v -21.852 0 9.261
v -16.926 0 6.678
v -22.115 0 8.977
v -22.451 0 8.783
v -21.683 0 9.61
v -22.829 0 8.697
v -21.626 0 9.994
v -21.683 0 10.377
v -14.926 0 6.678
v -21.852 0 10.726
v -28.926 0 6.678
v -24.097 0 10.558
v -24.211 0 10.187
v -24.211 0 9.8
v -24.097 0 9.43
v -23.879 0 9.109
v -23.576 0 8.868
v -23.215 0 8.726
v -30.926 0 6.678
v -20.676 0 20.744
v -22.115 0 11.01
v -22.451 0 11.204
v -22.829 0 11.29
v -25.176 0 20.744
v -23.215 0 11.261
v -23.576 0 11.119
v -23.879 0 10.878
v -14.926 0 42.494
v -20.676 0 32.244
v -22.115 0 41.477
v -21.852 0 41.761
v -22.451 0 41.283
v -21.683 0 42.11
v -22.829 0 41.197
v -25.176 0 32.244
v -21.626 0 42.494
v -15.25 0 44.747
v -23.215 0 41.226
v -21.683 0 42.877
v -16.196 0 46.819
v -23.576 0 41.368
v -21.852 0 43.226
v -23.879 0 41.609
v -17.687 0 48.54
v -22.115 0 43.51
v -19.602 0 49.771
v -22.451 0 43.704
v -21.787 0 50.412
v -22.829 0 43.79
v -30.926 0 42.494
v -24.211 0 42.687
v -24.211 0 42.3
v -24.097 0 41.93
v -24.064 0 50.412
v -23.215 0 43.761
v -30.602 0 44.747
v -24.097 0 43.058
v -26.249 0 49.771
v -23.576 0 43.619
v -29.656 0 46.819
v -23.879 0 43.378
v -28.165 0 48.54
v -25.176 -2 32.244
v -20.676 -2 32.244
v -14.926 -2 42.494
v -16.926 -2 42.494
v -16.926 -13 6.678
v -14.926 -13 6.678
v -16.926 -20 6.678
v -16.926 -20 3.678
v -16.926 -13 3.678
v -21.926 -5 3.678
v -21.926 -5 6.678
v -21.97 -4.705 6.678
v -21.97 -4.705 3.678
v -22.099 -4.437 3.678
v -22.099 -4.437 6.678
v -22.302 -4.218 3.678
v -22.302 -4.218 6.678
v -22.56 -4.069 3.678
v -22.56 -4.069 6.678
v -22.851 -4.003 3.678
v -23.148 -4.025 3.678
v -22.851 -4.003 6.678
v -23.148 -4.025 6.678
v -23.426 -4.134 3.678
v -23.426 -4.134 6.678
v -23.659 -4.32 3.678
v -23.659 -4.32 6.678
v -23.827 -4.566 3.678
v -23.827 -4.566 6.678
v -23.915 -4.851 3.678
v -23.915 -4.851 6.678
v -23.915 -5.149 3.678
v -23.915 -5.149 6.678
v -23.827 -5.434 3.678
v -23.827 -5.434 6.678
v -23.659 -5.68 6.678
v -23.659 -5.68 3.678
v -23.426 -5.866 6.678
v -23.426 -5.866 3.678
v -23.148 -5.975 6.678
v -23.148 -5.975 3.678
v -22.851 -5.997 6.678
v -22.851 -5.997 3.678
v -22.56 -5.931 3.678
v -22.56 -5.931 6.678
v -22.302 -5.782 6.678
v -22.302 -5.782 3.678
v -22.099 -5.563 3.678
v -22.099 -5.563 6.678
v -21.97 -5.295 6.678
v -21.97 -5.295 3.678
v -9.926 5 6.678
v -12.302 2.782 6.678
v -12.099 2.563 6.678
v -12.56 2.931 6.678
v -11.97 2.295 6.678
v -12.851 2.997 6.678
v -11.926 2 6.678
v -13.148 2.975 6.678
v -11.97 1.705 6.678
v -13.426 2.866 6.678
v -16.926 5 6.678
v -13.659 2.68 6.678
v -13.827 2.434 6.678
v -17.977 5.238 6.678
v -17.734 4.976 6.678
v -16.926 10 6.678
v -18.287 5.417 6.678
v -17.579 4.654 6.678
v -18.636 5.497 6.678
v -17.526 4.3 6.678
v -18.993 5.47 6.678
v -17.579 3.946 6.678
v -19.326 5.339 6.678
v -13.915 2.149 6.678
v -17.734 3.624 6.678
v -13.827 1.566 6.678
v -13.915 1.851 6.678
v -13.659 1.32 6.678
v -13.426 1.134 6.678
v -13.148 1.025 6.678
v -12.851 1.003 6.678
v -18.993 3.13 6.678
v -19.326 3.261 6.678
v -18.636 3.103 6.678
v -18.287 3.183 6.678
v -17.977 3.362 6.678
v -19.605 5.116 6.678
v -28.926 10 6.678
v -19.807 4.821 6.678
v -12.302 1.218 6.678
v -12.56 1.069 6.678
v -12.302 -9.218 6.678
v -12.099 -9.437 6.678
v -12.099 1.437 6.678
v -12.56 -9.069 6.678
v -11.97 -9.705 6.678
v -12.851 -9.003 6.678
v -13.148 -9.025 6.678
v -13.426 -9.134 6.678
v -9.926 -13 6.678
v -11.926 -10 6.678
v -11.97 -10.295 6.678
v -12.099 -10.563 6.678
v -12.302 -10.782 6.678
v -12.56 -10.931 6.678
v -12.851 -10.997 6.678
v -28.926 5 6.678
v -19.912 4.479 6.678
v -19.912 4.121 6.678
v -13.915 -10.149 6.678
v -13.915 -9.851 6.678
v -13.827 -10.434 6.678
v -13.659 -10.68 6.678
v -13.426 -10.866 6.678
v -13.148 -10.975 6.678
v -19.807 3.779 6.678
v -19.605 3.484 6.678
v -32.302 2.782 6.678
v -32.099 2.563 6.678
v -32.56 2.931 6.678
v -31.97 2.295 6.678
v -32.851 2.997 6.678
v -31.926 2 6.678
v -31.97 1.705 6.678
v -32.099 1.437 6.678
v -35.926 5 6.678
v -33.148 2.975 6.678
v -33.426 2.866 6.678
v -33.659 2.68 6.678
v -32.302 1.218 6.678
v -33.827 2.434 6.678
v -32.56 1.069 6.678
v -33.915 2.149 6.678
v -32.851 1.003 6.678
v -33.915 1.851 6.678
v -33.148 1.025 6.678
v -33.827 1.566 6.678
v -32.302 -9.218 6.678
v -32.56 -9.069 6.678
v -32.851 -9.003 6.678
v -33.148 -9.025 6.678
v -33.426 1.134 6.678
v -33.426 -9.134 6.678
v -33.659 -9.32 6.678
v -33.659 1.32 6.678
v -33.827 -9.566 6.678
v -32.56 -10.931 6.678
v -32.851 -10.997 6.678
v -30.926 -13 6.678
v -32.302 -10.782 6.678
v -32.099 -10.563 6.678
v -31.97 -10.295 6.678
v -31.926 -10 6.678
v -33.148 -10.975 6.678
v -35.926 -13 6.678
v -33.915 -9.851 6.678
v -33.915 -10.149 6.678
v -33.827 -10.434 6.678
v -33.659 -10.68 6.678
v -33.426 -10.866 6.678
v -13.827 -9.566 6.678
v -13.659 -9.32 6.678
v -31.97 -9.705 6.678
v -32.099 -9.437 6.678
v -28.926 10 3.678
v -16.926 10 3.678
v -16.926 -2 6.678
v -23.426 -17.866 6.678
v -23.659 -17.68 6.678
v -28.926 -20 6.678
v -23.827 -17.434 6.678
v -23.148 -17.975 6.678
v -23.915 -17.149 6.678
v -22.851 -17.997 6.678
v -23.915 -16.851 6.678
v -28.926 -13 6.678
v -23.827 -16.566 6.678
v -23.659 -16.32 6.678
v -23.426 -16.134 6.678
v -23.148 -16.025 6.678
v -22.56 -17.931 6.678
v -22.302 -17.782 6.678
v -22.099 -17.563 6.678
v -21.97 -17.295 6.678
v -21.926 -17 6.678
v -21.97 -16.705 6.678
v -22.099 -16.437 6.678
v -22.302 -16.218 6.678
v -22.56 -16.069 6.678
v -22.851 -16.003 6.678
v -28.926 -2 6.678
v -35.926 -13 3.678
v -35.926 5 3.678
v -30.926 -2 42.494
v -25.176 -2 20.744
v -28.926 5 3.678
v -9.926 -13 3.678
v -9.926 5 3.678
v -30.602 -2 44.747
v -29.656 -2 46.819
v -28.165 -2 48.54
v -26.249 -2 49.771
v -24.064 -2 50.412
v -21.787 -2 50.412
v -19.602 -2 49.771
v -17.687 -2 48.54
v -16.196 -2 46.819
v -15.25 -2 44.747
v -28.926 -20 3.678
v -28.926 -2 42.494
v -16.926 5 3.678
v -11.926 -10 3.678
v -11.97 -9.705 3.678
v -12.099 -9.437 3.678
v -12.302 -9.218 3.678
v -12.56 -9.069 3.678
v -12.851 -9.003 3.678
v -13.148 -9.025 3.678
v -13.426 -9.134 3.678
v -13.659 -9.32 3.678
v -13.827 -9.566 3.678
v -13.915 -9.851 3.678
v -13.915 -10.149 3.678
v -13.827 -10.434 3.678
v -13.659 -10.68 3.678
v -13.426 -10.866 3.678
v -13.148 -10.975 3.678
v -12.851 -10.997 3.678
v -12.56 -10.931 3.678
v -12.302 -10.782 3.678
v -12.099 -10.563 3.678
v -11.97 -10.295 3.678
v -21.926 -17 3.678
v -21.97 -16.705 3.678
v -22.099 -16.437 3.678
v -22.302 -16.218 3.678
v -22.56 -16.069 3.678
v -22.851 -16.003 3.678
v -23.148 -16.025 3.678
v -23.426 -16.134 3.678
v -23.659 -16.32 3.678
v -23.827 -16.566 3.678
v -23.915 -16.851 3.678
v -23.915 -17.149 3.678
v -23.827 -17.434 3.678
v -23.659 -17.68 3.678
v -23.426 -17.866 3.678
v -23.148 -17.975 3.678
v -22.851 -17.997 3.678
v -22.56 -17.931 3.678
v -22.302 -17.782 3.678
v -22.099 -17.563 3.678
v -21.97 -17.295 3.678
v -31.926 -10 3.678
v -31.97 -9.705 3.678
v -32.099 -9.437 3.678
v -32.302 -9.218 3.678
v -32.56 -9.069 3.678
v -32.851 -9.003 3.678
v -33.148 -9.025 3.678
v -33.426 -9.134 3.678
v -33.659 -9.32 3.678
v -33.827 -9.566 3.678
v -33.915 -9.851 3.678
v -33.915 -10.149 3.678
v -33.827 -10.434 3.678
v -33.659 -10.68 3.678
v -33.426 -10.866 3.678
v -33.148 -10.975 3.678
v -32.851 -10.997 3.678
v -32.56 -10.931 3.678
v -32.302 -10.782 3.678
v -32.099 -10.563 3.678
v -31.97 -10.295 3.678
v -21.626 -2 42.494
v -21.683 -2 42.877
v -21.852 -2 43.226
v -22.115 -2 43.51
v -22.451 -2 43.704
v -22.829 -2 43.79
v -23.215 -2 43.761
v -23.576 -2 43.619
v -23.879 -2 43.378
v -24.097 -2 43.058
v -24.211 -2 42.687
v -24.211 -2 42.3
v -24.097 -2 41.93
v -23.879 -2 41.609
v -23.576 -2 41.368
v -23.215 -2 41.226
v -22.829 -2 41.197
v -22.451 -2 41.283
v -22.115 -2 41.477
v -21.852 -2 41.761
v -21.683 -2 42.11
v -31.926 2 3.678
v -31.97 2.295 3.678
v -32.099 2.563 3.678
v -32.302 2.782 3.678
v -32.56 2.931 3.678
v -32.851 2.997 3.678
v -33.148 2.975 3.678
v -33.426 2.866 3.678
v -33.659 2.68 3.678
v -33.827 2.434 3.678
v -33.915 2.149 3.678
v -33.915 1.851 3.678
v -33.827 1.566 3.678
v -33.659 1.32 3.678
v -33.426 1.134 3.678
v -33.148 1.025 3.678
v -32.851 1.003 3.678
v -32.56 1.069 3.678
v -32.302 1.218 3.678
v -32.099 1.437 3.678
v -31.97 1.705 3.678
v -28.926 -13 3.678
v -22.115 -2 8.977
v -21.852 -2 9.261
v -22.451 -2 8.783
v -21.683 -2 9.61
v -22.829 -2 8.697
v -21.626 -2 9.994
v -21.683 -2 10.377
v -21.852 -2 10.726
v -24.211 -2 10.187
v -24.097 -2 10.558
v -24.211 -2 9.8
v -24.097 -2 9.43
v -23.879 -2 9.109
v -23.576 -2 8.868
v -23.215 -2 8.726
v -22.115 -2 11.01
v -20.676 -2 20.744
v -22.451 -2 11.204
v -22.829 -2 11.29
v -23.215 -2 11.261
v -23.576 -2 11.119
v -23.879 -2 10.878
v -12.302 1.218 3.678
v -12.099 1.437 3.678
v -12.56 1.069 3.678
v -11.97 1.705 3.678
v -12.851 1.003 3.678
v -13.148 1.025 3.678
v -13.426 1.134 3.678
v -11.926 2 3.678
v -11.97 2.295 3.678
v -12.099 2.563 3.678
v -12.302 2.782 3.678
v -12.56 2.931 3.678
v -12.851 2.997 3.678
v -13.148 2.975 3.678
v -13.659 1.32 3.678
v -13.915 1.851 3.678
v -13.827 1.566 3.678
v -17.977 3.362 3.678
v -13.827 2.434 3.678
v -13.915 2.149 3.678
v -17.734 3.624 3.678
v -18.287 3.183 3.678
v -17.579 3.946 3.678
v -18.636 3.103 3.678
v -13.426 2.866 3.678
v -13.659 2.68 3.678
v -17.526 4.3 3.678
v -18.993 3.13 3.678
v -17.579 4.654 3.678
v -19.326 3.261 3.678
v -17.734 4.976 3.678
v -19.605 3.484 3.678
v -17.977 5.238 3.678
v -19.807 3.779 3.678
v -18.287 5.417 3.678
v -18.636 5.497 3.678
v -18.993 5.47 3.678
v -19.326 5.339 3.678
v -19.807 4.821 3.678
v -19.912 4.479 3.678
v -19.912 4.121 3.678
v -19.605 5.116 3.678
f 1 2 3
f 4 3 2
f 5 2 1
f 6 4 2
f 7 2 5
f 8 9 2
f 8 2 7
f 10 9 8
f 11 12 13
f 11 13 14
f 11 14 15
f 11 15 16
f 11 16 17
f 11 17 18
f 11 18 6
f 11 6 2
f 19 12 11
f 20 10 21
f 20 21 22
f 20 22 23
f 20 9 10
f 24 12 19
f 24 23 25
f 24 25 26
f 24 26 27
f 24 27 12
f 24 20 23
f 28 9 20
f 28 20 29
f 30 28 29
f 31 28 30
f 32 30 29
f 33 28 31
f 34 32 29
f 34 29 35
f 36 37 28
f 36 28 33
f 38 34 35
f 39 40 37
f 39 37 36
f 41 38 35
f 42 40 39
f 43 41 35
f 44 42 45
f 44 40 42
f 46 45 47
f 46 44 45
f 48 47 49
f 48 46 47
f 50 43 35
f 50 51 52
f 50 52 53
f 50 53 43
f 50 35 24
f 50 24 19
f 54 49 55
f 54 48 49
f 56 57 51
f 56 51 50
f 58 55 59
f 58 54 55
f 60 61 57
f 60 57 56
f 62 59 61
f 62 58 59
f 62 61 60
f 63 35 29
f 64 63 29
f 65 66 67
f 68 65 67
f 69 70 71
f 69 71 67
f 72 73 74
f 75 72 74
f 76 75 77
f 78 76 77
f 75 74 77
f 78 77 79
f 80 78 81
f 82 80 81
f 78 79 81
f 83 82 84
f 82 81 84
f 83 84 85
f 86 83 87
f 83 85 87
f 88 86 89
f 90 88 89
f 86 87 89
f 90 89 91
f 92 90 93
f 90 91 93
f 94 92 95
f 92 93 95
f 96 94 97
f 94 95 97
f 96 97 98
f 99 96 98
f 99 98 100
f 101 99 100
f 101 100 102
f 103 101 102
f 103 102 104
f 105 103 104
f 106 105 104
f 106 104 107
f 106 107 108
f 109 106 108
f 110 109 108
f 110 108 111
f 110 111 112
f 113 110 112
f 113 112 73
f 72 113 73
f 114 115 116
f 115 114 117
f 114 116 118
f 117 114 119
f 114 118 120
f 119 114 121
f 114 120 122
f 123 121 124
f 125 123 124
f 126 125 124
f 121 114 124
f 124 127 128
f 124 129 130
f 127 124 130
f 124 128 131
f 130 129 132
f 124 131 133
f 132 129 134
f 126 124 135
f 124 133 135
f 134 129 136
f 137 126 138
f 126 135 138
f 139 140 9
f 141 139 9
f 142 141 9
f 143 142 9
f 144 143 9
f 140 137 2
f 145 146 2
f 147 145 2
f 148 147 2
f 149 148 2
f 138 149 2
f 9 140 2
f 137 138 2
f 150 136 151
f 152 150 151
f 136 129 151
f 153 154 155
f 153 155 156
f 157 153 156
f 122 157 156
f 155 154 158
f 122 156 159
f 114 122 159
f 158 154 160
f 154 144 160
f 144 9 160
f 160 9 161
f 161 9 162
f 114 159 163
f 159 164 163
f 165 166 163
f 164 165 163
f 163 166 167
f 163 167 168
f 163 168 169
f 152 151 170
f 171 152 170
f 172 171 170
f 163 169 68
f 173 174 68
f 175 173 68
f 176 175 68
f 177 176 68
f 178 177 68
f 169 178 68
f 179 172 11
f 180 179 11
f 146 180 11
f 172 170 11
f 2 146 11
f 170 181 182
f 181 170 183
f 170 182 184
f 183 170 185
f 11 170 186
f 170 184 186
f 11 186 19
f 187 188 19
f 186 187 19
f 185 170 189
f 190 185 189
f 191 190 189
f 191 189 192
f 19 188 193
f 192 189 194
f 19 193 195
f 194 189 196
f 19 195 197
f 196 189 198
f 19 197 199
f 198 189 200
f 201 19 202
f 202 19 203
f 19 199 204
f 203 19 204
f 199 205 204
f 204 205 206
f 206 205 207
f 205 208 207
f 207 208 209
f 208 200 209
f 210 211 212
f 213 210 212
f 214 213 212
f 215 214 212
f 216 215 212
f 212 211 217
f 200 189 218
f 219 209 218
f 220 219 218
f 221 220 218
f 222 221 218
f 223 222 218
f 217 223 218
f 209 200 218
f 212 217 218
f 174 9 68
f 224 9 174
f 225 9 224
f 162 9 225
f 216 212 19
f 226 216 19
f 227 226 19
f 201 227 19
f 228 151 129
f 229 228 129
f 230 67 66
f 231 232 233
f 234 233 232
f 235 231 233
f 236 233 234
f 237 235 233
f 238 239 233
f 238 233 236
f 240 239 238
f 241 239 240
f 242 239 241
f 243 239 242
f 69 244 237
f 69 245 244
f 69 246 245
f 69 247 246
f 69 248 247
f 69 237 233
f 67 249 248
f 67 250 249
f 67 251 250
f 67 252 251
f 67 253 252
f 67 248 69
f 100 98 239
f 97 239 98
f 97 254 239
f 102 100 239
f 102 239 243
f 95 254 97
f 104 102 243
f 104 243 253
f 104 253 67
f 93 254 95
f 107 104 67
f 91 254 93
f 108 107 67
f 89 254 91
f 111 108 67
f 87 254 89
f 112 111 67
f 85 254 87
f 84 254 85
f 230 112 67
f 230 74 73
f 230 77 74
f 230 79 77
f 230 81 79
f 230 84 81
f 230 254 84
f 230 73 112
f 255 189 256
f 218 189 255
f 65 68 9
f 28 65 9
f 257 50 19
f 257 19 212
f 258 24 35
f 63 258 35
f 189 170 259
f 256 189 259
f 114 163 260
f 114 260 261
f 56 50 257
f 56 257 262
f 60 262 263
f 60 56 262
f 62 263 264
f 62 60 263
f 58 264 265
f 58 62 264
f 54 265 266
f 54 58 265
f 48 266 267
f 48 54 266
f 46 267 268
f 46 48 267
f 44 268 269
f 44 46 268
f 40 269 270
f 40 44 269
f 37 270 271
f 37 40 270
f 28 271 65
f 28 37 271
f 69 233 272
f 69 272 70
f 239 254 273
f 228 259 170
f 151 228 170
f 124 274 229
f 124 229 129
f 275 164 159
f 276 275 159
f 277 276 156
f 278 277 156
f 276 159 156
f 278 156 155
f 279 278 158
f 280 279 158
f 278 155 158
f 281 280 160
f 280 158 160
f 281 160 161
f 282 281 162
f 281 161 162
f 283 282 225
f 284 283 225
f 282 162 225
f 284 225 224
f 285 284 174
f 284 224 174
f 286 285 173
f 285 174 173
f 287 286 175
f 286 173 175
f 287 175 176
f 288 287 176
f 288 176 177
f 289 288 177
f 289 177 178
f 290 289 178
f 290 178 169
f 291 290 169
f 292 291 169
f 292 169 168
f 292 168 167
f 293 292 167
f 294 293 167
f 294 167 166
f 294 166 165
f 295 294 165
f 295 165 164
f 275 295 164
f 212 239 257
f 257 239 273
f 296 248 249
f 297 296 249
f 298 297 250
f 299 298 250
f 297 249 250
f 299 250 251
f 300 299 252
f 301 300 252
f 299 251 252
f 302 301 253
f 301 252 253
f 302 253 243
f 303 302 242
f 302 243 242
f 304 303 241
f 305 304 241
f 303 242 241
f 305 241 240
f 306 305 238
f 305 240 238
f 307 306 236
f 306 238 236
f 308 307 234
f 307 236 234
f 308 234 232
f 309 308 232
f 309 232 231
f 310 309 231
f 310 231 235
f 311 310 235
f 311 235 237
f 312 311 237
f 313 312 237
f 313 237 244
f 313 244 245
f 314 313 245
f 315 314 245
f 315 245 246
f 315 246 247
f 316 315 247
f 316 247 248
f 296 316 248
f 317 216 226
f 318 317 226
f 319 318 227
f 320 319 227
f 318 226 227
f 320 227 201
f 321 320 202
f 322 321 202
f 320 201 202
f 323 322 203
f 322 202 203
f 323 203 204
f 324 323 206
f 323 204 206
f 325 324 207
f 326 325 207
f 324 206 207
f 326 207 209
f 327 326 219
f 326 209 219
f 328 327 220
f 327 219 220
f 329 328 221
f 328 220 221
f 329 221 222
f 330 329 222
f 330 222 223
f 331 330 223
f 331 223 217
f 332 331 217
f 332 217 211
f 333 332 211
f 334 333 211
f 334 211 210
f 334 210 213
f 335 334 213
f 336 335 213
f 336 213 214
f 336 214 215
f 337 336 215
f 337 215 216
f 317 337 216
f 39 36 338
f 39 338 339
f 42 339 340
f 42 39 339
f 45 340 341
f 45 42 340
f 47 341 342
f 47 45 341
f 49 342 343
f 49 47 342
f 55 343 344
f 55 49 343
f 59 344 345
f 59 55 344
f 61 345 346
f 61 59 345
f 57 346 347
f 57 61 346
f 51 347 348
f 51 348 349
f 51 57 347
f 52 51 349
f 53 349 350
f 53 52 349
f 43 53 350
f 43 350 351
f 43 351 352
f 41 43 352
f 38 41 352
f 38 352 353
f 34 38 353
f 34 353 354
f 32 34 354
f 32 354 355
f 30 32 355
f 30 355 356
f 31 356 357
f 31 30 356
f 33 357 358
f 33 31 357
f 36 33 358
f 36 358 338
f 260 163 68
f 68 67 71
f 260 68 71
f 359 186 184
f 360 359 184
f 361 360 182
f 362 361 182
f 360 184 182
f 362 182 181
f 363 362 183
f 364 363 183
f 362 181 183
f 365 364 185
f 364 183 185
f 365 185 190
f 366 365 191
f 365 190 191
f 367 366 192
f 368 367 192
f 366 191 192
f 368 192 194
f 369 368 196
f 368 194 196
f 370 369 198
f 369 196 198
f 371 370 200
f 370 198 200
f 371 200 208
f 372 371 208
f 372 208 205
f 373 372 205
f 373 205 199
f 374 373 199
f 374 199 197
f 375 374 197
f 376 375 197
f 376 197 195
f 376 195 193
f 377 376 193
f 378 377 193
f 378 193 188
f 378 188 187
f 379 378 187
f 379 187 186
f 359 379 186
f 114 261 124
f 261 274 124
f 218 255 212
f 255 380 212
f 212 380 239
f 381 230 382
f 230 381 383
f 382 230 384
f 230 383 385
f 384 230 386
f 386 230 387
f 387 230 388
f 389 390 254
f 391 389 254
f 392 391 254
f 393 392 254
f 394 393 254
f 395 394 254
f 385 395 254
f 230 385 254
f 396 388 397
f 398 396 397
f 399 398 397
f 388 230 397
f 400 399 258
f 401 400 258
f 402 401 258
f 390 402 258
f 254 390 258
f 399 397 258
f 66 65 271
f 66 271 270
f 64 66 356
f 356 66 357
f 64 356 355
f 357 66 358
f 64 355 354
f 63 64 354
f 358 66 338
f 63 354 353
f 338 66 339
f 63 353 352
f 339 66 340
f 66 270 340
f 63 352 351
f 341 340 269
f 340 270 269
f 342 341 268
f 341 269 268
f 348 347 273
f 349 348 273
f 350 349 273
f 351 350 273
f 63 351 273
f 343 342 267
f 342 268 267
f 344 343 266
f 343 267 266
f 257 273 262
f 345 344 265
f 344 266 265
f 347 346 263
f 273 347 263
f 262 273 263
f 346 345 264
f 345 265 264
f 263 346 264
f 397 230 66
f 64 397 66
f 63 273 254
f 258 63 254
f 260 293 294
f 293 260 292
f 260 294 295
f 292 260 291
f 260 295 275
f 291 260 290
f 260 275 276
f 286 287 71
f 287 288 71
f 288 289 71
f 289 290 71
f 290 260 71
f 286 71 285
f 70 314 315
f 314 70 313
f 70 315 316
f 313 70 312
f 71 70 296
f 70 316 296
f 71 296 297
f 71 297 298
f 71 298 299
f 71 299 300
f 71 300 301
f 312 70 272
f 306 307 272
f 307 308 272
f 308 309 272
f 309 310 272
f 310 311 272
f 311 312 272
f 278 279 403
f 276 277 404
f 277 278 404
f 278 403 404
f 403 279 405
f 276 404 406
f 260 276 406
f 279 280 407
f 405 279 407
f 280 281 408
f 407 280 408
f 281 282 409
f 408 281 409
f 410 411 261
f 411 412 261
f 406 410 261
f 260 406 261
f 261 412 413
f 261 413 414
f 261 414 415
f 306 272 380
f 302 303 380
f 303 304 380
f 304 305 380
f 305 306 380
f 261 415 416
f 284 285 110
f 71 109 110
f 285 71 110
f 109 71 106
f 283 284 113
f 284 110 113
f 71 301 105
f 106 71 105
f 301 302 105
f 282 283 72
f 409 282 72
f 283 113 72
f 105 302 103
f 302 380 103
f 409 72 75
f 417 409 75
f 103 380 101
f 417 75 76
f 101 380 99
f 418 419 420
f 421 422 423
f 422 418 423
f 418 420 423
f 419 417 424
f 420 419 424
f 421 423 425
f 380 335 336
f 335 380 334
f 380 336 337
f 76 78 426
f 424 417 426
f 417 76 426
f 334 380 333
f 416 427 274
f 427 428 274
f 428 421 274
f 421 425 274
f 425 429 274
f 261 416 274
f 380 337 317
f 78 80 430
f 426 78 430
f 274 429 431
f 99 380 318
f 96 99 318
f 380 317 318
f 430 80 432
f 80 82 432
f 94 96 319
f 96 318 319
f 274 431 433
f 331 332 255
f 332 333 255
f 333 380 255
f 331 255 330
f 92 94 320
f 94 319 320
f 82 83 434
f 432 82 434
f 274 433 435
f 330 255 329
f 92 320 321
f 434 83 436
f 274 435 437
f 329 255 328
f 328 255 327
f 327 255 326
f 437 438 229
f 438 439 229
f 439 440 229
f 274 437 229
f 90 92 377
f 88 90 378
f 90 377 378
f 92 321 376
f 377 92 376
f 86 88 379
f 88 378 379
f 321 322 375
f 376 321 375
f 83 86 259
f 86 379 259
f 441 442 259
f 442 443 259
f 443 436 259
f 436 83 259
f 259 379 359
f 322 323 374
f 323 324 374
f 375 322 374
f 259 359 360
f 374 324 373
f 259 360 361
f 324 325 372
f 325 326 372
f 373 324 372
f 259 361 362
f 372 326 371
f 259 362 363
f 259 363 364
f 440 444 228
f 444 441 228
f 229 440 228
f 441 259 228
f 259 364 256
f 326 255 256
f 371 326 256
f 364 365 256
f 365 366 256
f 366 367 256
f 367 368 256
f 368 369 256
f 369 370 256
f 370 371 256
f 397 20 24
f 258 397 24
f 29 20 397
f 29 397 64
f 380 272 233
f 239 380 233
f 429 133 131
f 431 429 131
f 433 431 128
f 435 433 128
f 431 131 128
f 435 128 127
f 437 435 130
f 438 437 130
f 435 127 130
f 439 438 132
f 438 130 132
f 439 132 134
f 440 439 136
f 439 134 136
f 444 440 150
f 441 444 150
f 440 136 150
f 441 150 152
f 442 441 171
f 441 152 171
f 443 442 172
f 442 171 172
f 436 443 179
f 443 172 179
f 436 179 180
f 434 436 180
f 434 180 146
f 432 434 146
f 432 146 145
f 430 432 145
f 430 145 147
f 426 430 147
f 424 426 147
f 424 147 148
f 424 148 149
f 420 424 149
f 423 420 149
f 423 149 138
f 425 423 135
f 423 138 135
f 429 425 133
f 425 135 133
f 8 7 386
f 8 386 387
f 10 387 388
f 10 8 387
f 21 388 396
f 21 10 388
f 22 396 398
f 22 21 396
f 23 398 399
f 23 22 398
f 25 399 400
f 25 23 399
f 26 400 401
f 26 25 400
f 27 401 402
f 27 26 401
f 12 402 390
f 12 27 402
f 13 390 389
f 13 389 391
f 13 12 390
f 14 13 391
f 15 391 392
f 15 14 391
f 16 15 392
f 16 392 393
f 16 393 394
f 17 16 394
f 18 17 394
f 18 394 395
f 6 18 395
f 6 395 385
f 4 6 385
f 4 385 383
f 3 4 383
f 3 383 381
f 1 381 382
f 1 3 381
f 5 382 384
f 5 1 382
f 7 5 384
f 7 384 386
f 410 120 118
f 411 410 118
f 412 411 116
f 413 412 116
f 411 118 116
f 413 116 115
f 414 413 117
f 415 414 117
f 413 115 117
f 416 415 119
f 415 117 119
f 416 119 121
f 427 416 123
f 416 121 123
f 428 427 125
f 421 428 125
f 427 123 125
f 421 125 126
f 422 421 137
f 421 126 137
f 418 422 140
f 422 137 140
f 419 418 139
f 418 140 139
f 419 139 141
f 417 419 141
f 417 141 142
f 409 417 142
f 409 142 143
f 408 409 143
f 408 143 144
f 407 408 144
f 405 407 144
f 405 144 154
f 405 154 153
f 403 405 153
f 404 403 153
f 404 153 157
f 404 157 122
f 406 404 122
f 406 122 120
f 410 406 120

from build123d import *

# Parameters (mm, degrees)
F0_R          = 1.3
F1_DEPTH      = 2
F2_W          = 12
F2_H          = 3
F3_DEPTH      = 18
F3_DEPTH_BACK = 12
F4_W          = 5
F4_H          = 3
F4_W_2        = 2
F4_H_2        = 35.8160760757
F5_DEPTH      = 2
F6_W          = 2
F6_H          = 35.8160760757
F7_DEPTH      = 2
F9_DEPTH      = 5
F11_DEPTH     = 5
F12_R         = 1
F13_DEPTH     = 5
F14_W         = 2.25
F14_H         = 11.5
F15_DEPTH     = 3
F16_R         = 1.2
F17_DEPTH     = 3
F19_DEPTH     = 2


with BuildPart() as f1:
    # F0 (on Front) → F1 (new body)
    with BuildSketch(Plane.XZ):
        with BuildLine():
            Line((-16.9256870747, 6.6775220651), (-16.9256870747, 9.9935981408))
            Line((-16.9256870747, 9.9935981408), (-16.9256870747, 10.6775220651))
            Line((-16.9256870747, 10.6775220651), (-16.9256870747, 42.4935981408))
            ThreePointArc((-16.9256870747, 42.4935981408), (-22.9256870747, 48.4935981408), (-28.9256870747, 42.4935981408))
            Line((-28.9256870747, 42.4935981408), (-28.9256870747, 9.9935981408))
            Line((-28.9256870747, 9.9935981408), (-28.9256870747, 6.6775220651))
            Line((-28.9256870747, 6.6775220651), (-16.9424954802, 6.6775220651))
            Line((-16.9424954802, 6.6775220651), (-16.9256870747, 6.6775220651))
        make_face()
        with Locations((-22.9256870747, 9.9935981408)):
            Circle(F0_R, mode=Mode.SUBTRACT)
        with Locations((-22.9256870747, 42.4935981408)):
            Circle(F0_R, mode=Mode.SUBTRACT)
    extrude(amount=F1_DEPTH)

    # F2 (on face) → F3 (join, two sides)
    with BuildSketch(Plane.XZ.offset(2)) as f3_sk:
        with Locations((-22.9256870747, 5.1775220651)):
            Rectangle(F2_W, F2_H)
    extrude(amount=F3_DEPTH)
    extrude(f3_sk.sketch, amount=-F3_DEPTH_BACK)

    # F4 (on face) → F5 (join)
    with BuildSketch(Plane.YZ.offset(-16.9256870747)):
        Polygon((-13, 6.6775220651), (-2, 6.6775220651), (-2, 42.4935981408), align=None)
        Polygon((0, 3.6775220651), (0, 6.6775220651), (-2, 6.6775220651), (-13, 6.6775220651), (-13, 3.6775220651), align=None)
        with Locations((2.5, 5.1775220651)):
            Rectangle(F4_W, F4_H)
        with Locations((-1, 24.5855601029)):
            Rectangle(F4_W_2, F4_H_2)
    extrude(amount=F5_DEPTH)

    # F6 (on face) → F7 (join)
    with BuildSketch(Plane(origin=(-28.9256870747, 0, 0), x_dir=(0, -1, 0), z_dir=(-1, 0, 0))):
        Polygon((0, 6.6775220651), (-5, 6.6775220651), (-5, 3.6775220651), (13, 3.6775220651), (13, 6.6775220651), (2, 6.6775220651), align=None)
        Polygon((2, 42.4935981408), (2, 6.6775220651), (13, 6.6775220651), align=None)
        with Locations((1, 24.5855601029)):
            Rectangle(F6_W, F6_H)
    extrude(amount=F7_DEPTH)

    # F8 (on face) → F9 (join)
    with BuildSketch(Plane(origin=(-30.9256870747, 0, 0), x_dir=(0, -1, 0), z_dir=(-1, 0, 0))):
        Polygon((0, 6.6775220651), (-5, 6.6775220651), (-5, 3.6775220651), (13, 3.6775220651), (13, 6.6775220651), align=None)
    extrude(amount=F9_DEPTH)

    # F10 (on face) → F11 (join)
    with BuildSketch(Plane.YZ.offset(-14.9256870747)):
        Polygon((0, 6.6775220651), (-13, 6.6775220651), (-13, 3.6775220651), (5, 3.6775220651), (5, 6.6775220651), align=None)
    extrude(amount=F11_DEPTH)

    # F12 (on face) → F13 (cut)
    with BuildSketch(Plane.XY.offset(6.6775220651)):
        with Locations((-32.9256870747, 2)):
            Circle(F12_R)
        with Locations((-12.9256870747, 2)):
            Circle(F12_R)
        with Locations((-12.9256870747, -10)):
            Circle(F12_R)
        with Locations((-22.9256870747, -5)):
            Circle(F12_R)
        with Locations((-32.9256870747, -10)):
            Circle(F12_R)
        with Locations((-22.9256870747, -17)):
            Circle(F12_R)
    extrude(amount=-F13_DEPTH, mode=Mode.SUBTRACT)

    # F14 (on face) → F15 (cut)
    with BuildSketch(Plane(origin=(0, 0, 0), x_dir=(-1, 0, 0), z_dir=(0, 1, 0))):
        with Locations((24.0506870747, 26.4935981408)):
            Rectangle(F14_W, F14_H)
        with Locations((21.8006870747, 26.4935981408)):
            Rectangle(F14_W, F14_H)
    extrude(amount=-F15_DEPTH, mode=Mode.SUBTRACT)

    # F16 (on face) → F17 (cut)
    with BuildSketch(Plane.XY.offset(6.6775220651)):
        with Locations((-18.7256870747, 4.3)):
            Circle(F16_R)
    extrude(amount=-F17_DEPTH, mode=Mode.SUBTRACT)

    # F18 (on face) → F19 (join)
    with BuildSketch(Plane(origin=(0, 0, 0), x_dir=(-1, 0, 0), z_dir=(0, 1, 0))):
        with BuildLine():
            Line((28.9256870747, 42.4935981408), (30.9256870747, 42.4935981408))
            ThreePointArc((30.9256870747, 42.4935981408), (22.9256870747, 50.4935981408), (14.9256870747, 42.4935981408))
            Line((14.9256870747, 42.4935981408), (16.9256870747, 42.4935981408))
            ThreePointArc((16.9256870747, 42.4935981408), (22.9256870747, 48.4935981408), (28.9256870747, 42.4935981408))
        make_face()
    extrude(amount=-F19_DEPTH)


solid = f1.part
